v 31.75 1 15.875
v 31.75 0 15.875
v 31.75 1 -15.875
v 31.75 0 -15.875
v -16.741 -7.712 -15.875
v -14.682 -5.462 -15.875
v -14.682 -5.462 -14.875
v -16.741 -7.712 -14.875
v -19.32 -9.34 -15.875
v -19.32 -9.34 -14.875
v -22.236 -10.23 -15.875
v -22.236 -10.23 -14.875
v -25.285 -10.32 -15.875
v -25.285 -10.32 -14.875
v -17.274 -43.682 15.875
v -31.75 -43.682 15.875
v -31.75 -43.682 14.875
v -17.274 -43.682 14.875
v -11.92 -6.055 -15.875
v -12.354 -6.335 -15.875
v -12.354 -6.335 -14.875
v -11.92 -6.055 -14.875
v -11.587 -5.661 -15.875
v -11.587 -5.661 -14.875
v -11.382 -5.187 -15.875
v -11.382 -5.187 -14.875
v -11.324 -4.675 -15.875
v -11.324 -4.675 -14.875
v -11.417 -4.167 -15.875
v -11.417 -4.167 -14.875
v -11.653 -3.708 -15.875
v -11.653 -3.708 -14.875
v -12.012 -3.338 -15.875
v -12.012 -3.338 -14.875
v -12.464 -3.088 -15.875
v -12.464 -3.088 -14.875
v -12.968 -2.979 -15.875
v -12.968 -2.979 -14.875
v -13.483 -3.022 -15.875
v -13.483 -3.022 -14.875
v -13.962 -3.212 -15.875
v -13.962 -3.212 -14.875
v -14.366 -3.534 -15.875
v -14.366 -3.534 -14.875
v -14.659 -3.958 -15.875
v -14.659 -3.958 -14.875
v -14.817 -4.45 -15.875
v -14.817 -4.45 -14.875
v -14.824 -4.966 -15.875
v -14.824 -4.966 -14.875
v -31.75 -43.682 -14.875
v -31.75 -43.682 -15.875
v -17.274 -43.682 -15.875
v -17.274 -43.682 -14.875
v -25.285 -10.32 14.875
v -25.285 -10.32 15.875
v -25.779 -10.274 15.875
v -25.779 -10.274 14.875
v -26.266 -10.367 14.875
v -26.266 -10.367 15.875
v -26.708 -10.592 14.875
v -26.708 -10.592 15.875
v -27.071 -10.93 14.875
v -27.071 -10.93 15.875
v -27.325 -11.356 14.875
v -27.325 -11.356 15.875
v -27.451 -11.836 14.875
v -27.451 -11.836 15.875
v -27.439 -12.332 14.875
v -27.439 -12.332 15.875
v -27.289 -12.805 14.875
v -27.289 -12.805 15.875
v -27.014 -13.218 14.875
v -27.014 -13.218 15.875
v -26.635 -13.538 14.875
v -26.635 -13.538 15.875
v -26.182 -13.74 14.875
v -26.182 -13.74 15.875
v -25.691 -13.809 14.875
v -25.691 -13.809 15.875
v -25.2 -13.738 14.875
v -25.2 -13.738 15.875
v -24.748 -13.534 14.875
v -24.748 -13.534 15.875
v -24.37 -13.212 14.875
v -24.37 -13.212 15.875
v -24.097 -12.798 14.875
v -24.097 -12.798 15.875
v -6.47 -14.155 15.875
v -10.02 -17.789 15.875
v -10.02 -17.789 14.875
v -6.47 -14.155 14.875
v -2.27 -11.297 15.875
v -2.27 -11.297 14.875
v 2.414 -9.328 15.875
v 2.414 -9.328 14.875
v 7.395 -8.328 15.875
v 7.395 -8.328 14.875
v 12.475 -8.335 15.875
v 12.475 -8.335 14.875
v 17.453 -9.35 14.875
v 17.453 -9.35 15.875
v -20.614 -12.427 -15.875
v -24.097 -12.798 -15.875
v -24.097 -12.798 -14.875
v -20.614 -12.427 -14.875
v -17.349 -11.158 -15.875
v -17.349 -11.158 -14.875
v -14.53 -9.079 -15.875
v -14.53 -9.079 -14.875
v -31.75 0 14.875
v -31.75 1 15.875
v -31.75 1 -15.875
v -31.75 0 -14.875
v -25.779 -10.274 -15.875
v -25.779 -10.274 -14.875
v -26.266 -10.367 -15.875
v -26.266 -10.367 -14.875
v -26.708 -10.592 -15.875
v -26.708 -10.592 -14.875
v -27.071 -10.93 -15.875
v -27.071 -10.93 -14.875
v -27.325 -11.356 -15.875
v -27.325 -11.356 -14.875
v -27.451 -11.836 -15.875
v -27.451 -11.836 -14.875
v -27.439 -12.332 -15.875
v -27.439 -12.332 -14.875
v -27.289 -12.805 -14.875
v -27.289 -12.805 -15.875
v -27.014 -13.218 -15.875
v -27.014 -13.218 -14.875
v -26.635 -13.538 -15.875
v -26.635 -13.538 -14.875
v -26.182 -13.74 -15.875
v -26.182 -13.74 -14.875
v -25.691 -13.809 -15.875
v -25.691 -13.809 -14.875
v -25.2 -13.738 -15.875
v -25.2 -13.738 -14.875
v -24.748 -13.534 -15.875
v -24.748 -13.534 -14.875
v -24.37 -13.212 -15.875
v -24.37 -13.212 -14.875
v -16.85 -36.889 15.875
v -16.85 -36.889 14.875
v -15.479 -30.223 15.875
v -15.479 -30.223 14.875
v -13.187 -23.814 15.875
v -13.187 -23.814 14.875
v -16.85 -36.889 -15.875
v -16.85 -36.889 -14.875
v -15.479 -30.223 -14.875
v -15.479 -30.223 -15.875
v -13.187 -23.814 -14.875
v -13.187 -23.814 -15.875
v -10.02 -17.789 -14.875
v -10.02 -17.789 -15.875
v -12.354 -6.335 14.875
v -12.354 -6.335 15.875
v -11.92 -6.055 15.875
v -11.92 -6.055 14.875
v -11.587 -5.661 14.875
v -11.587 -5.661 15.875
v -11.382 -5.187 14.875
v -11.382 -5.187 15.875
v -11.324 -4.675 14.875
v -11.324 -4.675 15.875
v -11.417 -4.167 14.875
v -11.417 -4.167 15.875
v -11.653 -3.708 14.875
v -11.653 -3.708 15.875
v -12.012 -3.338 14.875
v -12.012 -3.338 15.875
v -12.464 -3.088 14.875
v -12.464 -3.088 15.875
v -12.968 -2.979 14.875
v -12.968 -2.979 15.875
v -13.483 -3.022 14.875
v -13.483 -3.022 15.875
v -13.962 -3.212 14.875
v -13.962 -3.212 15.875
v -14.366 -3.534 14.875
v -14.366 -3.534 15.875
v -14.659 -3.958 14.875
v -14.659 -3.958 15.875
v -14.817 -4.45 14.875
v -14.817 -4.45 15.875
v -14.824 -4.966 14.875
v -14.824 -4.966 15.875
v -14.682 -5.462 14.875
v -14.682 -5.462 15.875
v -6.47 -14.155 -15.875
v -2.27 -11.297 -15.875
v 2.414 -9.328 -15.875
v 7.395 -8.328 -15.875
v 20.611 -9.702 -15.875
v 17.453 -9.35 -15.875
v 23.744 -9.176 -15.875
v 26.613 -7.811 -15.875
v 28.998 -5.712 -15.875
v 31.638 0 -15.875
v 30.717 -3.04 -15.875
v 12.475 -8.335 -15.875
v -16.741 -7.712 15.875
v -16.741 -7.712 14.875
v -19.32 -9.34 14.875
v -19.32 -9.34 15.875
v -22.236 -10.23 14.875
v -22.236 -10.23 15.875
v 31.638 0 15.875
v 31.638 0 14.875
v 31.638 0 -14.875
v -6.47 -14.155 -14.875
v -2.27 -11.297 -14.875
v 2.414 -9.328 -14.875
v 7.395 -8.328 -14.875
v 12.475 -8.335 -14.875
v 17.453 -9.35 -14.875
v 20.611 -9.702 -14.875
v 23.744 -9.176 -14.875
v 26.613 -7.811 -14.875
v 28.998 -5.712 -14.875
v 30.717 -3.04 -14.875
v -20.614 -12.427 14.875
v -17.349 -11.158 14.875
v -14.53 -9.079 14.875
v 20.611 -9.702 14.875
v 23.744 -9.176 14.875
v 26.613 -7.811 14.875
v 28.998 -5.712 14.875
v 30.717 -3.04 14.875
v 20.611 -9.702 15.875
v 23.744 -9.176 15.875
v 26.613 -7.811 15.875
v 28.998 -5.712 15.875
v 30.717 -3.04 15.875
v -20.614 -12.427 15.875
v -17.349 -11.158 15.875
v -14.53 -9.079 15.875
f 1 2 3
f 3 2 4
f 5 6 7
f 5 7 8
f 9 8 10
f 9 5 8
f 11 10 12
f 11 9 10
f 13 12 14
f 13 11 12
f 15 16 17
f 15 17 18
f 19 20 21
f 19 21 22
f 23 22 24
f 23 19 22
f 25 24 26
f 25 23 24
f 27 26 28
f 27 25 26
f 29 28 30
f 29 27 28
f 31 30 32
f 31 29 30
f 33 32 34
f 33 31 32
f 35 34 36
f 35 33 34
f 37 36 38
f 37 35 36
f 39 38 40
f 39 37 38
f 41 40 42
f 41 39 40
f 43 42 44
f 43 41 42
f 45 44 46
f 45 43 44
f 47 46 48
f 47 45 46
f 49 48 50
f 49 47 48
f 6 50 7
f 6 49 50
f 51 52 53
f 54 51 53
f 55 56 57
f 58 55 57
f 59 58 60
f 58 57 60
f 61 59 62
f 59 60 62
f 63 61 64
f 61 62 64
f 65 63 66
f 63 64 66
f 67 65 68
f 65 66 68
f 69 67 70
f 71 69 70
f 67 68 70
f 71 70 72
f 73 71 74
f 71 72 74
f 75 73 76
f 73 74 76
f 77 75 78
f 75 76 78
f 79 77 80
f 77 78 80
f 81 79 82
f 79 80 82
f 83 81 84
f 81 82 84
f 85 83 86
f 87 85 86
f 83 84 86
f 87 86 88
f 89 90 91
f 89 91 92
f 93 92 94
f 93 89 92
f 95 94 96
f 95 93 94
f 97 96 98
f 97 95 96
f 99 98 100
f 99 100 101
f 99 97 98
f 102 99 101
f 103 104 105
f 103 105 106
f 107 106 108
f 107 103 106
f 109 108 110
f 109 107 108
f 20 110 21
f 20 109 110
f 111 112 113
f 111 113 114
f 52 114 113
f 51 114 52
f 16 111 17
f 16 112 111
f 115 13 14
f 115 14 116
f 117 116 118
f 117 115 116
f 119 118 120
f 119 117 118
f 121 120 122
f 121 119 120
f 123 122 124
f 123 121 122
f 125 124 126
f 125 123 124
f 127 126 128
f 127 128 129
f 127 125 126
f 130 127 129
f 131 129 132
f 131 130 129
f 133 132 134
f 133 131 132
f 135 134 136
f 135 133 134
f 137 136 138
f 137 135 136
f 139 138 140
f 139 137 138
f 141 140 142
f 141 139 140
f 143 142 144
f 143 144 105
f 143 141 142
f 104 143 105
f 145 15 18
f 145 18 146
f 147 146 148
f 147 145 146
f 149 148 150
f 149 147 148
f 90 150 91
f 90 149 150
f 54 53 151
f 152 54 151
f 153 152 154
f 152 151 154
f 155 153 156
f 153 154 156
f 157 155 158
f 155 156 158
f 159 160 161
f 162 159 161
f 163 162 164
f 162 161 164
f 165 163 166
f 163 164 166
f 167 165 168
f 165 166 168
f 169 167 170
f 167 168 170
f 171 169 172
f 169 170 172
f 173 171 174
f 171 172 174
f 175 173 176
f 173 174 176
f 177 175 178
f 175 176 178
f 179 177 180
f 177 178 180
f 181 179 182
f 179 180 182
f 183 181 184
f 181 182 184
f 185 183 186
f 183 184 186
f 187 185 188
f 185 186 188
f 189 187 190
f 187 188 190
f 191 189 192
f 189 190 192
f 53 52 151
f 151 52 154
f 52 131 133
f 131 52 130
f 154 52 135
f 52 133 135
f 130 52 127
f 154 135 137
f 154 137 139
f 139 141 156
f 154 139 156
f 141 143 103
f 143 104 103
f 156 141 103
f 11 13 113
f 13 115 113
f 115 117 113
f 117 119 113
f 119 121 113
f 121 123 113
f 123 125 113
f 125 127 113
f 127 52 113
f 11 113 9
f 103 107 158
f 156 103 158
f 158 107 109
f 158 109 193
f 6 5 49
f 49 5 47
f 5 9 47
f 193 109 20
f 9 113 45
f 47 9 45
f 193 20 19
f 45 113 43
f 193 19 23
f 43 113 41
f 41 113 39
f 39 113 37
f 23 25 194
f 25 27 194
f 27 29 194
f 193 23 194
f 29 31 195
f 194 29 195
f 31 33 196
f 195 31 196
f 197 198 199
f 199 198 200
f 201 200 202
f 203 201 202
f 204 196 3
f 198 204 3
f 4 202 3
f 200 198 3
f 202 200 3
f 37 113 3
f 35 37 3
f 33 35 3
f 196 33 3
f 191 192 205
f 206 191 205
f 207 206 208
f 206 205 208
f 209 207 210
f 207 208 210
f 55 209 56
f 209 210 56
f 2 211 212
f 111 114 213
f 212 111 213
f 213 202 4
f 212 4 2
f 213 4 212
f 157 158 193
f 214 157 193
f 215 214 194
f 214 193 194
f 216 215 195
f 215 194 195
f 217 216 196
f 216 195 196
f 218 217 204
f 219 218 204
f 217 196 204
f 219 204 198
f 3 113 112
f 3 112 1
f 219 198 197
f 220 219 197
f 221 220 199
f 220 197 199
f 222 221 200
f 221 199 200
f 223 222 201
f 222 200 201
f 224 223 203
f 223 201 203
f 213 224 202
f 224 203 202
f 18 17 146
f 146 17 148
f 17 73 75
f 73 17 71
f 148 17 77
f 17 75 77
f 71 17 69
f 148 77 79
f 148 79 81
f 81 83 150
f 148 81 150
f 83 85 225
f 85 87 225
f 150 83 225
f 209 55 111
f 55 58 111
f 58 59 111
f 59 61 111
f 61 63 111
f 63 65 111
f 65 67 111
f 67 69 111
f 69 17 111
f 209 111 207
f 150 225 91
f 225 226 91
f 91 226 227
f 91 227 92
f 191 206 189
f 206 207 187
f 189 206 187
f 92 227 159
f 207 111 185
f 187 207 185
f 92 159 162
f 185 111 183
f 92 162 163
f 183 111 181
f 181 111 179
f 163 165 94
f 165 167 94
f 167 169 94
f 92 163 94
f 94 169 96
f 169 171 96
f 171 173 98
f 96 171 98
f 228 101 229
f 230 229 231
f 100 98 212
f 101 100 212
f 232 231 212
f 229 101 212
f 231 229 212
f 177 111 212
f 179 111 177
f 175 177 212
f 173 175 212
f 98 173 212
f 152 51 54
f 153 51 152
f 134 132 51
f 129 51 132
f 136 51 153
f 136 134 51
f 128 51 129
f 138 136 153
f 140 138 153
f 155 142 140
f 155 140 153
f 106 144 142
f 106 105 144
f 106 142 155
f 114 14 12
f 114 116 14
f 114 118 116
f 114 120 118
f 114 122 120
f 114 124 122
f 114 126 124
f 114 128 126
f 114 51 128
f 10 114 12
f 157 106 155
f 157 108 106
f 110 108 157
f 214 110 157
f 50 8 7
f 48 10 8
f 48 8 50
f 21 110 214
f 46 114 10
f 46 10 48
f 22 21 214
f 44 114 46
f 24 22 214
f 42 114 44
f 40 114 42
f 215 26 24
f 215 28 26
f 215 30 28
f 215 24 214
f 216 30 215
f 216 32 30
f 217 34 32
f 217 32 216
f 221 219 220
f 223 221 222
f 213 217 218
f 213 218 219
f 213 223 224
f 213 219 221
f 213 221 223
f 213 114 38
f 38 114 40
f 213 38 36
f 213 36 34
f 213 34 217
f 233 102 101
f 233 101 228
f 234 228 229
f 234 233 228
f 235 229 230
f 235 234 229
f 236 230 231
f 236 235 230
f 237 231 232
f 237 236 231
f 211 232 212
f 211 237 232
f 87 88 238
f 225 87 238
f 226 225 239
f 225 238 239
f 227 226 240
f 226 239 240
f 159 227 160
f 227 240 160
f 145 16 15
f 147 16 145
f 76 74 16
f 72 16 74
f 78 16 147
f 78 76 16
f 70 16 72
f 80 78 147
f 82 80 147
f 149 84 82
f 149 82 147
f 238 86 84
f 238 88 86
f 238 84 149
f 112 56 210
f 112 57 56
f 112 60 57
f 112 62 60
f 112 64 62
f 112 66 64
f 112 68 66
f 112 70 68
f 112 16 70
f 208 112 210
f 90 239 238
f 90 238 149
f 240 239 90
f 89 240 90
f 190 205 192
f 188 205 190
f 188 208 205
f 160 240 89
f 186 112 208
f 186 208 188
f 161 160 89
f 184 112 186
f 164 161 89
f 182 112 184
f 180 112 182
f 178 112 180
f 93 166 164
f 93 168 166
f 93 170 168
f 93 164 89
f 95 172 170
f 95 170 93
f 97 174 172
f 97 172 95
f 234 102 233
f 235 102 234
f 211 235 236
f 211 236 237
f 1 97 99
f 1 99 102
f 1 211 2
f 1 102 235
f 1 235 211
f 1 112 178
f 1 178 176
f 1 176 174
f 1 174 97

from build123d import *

# Parameters (mm, degrees)
SKETCH1_W           = 63.5
SKETCH1_H           = 31.75
BOSS_EXTRUDE1_DEPTH = 1
BOSS_EXTRUDE2_DEPTH = 1


with BuildPart() as part:
    # Sketch1 → Boss-Extrude1 (new body)
    with BuildSketch(Plane(origin=(0, 0, 0), x_dir=(1, 0, 0), z_dir=(0, 1, 0))):
        Rectangle(SKETCH1_W, SKETCH1_H)
    extrude(amount=BOSS_EXTRUDE1_DEPTH)

    # Sketch2 → Boss-Extrude2 (add)
    with BuildSketch(Plane(origin=(0, 0, -15.875), x_dir=(-1, 0, 0), z_dir=(0, 0, -1))):
        with BuildLine():
            Line((31.75, -17.789177687), (31.75, -43.682471344))
            Line((31.75, -43.682471344), (17.274395694, -43.682471344))
            ThreePointArc((17.274395694, -43.682471344), (15.478784489, -30.222698339), (10.02009663, -17.789177687))
            ThreePointArc((10.02009663, -17.789177687), (-2.413824992, -9.328234834), (-17.453421679, -9.350424234))
            ThreePointArc((-17.453421679, -9.350424234), (-27.026572228, -7.52456476), (-31.75, 1))
            Line((-31.75, 1), (31.75, 1))
            Line((31.75, 1), (31.75, -17.789177687))
        make_face()
        with BuildLine():
            ThreePointArc((14.682172322, -5.461834054), (19.319604518, -9.339676808), (25.284625693, -10.320474532))
            ThreePointArc((25.284625693, -10.320474532), (27.289464402, -12.805118584), (24.096851126, -12.797716819))
            ThreePointArc((24.096851126, -12.797716819), (17.34915582, -11.158394953), (12.353647921, -6.335152376))
            ThreePointArc((12.353647921, -6.335152376), (12.463721653, -3.08771562), (14.682172322, -5.461834054))
        make_face(mode=Mode.SUBTRACT)
    boss_extrude2 = extrude(amount=-BOSS_EXTRUDE2_DEPTH)

    # Mirror1: Boss-Extrude2 across plane
    add(boss_extrude2.mirror(Plane.XY))


solid = part.part
